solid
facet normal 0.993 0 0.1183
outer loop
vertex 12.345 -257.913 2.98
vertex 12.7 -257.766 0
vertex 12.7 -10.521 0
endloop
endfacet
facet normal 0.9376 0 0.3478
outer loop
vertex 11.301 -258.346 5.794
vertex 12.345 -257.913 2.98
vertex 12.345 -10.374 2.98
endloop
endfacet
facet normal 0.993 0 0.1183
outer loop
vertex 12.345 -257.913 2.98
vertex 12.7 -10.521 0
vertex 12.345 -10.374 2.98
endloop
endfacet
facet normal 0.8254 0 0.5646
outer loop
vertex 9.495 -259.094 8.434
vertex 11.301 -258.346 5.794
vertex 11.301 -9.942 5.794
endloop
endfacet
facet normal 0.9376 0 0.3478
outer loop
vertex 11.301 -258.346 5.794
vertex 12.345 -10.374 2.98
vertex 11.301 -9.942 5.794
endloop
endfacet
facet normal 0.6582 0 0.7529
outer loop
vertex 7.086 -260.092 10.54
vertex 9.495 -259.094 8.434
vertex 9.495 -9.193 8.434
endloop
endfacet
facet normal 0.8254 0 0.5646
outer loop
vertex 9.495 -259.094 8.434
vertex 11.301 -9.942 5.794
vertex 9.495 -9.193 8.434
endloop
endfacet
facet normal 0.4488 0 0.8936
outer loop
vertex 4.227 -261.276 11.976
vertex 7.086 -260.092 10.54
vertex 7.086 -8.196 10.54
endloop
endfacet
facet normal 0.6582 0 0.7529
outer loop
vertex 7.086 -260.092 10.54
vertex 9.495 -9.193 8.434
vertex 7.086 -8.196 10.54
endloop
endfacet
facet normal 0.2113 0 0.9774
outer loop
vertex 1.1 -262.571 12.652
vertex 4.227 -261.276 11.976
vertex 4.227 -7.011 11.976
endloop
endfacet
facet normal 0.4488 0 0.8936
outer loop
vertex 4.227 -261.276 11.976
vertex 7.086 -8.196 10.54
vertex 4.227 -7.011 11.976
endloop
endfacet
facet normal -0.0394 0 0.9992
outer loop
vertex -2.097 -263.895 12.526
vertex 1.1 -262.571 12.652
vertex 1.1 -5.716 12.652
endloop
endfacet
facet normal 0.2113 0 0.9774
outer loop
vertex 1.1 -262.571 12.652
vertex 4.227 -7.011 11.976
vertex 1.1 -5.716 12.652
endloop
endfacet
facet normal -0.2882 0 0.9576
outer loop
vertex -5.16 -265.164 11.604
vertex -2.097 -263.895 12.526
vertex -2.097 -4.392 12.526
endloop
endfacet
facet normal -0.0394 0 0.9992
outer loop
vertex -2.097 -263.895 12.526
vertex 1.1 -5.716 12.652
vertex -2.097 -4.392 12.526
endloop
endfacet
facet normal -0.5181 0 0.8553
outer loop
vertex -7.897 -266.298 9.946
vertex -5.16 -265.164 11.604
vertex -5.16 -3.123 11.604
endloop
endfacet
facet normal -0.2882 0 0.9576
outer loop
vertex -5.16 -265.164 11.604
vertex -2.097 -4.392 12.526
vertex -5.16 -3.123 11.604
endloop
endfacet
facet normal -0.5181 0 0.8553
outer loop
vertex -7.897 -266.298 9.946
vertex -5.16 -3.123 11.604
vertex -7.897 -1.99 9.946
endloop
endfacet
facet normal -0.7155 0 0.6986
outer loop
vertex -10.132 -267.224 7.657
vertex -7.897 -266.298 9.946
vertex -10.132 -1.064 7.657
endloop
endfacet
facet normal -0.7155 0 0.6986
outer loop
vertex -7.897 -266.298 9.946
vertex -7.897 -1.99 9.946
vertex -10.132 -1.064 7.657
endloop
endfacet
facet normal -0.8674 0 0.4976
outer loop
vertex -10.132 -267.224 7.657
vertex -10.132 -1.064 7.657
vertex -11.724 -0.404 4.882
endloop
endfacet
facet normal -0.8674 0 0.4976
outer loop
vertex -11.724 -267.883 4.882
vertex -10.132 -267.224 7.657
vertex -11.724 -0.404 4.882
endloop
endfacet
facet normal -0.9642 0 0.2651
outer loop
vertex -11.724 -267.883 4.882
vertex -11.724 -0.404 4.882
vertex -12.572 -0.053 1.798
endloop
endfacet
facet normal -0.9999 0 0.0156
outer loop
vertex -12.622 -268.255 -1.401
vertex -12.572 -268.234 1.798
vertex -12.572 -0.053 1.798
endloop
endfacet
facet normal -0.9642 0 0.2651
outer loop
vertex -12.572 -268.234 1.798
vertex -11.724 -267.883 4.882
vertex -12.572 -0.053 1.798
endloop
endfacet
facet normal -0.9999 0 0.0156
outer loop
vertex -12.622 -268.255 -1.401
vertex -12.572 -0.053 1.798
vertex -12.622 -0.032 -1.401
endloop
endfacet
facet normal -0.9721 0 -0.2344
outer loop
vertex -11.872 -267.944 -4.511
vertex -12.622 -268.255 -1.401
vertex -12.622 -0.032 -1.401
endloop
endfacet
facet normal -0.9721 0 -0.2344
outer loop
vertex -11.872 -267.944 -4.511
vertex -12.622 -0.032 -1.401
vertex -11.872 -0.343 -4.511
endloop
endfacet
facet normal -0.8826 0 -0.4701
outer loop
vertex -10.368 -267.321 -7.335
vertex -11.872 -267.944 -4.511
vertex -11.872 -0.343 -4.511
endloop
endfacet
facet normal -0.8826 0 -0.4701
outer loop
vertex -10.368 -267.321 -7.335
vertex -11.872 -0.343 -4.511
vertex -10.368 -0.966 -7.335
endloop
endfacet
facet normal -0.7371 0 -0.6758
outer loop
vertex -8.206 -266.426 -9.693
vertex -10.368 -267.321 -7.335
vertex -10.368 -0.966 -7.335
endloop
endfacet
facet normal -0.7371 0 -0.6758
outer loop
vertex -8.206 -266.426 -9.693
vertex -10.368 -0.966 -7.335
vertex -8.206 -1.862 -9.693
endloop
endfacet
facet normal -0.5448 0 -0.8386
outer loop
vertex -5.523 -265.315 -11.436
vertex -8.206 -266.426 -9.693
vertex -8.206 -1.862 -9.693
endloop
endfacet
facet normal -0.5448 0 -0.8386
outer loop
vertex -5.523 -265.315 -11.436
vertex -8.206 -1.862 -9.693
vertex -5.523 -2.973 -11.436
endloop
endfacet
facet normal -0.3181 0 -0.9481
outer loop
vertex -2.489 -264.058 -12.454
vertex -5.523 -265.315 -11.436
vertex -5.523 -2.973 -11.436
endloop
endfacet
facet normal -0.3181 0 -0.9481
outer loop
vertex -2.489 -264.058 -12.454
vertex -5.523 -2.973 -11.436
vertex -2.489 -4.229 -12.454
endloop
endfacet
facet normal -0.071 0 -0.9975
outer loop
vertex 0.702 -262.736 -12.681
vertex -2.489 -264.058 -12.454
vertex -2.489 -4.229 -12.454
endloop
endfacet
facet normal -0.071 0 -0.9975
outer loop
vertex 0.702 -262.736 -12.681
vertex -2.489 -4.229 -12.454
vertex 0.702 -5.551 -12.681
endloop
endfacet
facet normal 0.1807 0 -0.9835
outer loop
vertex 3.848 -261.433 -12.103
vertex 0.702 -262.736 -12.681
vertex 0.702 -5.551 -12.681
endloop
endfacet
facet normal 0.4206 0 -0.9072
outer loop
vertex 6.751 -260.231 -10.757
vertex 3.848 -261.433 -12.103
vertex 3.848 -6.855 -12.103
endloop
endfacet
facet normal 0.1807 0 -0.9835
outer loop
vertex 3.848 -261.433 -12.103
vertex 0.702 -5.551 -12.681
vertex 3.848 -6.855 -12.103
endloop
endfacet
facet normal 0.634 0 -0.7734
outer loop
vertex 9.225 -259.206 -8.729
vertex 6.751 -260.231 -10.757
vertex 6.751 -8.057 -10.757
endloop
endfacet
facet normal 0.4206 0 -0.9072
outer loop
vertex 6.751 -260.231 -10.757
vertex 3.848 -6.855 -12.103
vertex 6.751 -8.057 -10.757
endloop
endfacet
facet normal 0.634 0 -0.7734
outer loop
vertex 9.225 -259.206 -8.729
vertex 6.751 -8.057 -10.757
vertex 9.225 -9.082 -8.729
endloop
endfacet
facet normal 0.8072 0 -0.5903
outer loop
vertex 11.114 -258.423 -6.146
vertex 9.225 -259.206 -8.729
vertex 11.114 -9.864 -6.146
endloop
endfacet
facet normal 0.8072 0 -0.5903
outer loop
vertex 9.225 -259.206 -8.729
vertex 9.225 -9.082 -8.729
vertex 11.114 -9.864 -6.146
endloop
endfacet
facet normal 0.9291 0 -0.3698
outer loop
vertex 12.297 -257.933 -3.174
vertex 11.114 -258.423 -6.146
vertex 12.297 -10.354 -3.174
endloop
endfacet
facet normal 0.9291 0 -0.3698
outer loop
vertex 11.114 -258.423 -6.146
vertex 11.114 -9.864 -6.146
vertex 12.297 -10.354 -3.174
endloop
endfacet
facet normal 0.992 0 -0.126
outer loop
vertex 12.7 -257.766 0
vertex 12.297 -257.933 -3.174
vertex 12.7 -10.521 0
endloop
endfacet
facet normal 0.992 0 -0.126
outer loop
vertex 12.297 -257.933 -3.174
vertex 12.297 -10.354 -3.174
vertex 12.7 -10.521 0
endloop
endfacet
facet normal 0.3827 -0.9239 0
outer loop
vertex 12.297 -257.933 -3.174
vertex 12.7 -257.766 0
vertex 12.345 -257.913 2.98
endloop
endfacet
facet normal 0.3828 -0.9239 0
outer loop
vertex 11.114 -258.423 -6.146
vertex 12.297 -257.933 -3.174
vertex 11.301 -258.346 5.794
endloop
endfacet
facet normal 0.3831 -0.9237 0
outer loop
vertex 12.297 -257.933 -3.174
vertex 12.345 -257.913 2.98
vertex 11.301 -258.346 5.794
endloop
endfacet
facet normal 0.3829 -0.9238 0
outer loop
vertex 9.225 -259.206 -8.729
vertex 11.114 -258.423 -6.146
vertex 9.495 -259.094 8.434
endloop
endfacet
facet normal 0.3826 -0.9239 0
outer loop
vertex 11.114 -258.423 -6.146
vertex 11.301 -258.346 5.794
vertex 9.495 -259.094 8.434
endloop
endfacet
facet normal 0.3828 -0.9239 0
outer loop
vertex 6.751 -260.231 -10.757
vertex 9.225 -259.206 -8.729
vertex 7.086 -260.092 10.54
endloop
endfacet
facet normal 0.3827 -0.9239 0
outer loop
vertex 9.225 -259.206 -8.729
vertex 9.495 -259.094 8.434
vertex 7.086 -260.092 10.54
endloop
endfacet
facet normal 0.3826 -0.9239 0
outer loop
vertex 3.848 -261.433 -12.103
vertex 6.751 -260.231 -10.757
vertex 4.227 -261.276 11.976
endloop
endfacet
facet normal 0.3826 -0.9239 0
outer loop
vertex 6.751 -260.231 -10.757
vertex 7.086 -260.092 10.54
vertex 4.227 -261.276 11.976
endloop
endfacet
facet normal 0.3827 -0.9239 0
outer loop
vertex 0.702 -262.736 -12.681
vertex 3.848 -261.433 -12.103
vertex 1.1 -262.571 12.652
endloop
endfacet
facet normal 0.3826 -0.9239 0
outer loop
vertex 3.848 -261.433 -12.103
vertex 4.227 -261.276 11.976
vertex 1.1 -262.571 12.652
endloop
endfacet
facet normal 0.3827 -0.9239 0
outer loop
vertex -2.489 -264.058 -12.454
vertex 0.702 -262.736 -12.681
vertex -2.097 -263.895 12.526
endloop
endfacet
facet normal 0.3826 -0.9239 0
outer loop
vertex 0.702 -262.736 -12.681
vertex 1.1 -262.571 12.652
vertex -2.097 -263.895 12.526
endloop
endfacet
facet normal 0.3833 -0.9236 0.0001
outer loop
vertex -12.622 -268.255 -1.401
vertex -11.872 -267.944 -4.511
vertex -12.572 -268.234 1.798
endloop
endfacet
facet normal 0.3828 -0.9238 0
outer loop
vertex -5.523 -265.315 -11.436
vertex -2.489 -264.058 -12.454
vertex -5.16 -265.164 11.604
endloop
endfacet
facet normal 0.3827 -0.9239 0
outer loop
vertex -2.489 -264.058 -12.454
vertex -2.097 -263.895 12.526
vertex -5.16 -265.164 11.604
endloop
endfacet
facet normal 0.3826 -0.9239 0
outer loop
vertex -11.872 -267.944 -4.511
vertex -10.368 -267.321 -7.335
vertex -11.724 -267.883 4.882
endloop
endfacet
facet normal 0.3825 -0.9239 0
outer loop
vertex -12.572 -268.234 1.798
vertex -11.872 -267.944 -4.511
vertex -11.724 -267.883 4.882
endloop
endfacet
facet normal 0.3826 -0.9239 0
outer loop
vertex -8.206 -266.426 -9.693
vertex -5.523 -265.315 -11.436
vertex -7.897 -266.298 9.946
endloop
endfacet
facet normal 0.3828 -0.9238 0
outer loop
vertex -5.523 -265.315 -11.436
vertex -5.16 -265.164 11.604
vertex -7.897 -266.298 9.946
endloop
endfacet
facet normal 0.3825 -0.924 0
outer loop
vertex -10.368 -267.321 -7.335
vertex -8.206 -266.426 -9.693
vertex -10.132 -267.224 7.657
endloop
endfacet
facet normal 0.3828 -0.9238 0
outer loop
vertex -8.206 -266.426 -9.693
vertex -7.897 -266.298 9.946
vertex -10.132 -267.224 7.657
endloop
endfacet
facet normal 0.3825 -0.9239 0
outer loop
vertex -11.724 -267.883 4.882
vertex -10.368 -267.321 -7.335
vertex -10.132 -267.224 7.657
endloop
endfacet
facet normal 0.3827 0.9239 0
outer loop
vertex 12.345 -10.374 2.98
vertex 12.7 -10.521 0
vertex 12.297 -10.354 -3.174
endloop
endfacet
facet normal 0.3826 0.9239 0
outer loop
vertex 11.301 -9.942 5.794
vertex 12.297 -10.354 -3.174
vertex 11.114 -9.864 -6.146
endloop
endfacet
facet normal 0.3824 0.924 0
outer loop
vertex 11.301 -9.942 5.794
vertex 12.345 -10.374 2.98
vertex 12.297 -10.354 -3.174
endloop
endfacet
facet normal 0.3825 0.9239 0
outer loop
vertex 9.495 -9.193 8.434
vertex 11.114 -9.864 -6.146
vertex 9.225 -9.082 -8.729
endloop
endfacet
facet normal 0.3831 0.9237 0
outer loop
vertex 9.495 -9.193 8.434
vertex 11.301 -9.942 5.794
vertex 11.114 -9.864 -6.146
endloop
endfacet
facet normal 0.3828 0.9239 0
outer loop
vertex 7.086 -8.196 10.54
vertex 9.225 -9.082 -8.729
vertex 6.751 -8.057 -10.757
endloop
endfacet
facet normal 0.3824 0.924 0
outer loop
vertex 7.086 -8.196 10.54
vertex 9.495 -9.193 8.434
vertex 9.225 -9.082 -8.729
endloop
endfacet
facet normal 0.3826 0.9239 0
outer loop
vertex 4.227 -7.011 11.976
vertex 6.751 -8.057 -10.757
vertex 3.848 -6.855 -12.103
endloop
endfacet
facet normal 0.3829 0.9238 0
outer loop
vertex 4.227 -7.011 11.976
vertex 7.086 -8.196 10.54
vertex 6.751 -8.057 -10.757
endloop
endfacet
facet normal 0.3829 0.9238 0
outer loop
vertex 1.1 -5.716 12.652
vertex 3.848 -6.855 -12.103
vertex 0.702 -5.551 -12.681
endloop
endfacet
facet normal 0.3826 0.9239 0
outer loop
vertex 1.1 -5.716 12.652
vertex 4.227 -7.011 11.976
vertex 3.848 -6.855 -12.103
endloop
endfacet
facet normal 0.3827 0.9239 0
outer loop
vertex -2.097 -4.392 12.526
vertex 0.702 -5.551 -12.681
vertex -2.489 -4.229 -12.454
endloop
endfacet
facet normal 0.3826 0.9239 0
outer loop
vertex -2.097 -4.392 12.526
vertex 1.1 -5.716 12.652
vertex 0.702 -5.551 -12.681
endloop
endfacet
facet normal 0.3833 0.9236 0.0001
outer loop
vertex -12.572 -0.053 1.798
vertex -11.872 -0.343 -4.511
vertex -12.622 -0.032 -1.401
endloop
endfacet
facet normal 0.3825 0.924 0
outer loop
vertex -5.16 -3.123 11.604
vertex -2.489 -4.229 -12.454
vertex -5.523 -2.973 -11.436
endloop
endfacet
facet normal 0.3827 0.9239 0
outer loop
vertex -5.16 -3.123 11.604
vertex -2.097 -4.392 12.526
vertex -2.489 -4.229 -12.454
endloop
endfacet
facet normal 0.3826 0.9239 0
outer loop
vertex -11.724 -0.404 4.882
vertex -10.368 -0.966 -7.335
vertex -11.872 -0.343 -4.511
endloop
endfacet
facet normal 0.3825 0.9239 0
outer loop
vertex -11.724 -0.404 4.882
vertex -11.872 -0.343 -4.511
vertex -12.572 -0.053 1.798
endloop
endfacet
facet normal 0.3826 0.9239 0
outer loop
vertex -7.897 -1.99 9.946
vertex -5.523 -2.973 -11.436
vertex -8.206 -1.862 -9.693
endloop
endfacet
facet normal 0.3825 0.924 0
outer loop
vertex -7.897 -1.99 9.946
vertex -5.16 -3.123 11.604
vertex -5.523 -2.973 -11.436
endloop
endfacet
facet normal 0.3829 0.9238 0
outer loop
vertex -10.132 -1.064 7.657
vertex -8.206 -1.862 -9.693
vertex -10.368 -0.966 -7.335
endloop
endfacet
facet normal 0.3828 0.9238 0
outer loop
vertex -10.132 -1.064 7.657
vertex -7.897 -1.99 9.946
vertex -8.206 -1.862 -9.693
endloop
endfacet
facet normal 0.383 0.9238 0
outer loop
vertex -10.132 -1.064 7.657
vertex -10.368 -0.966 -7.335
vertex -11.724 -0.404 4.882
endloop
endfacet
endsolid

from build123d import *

# Parameters (mm, degrees)
F1_R      = 12.7
F2_DEPTH  = 268.2875
F6_W      = 114.097729
F6_H      = 88.5094
F7_DEPTH  = 25.4
F11_W     = 145.65833
F11_H     = 82.475946
F12_DEPTH = 25.4


with BuildPart() as f2:
    # F1 (on face) → F2 (new body)
    with BuildSketch(Plane.XZ):
        Circle(F1_R)
    extrude(amount=F2_DEPTH)

    # F6 (on face) → F7 (cut)
    with BuildSketch(Plane(origin=(92.994083, -224.507577, 0), x_dir=(-0.92388, -0.382683, 0), z_dir=(-0.382683, 0.92388, 0))):
        with Locations((118.185877, 2.949333)):
            Rectangle(F6_W, F6_H)
    extrude(amount=-F7_DEPTH, mode=Mode.SUBTRACT)

    # F11 (on face) → F12 (cut)
    with BuildSketch(Plane(origin=(-1.859872, -4.490128, 0), x_dir=(-0.92388, 0.382683, 0), z_dir=(0.382683, 0.92388, 0))):
        Rectangle(F11_W, F11_H)
    extrude(amount=F12_DEPTH, mode=Mode.SUBTRACT)


solid = f2.part
